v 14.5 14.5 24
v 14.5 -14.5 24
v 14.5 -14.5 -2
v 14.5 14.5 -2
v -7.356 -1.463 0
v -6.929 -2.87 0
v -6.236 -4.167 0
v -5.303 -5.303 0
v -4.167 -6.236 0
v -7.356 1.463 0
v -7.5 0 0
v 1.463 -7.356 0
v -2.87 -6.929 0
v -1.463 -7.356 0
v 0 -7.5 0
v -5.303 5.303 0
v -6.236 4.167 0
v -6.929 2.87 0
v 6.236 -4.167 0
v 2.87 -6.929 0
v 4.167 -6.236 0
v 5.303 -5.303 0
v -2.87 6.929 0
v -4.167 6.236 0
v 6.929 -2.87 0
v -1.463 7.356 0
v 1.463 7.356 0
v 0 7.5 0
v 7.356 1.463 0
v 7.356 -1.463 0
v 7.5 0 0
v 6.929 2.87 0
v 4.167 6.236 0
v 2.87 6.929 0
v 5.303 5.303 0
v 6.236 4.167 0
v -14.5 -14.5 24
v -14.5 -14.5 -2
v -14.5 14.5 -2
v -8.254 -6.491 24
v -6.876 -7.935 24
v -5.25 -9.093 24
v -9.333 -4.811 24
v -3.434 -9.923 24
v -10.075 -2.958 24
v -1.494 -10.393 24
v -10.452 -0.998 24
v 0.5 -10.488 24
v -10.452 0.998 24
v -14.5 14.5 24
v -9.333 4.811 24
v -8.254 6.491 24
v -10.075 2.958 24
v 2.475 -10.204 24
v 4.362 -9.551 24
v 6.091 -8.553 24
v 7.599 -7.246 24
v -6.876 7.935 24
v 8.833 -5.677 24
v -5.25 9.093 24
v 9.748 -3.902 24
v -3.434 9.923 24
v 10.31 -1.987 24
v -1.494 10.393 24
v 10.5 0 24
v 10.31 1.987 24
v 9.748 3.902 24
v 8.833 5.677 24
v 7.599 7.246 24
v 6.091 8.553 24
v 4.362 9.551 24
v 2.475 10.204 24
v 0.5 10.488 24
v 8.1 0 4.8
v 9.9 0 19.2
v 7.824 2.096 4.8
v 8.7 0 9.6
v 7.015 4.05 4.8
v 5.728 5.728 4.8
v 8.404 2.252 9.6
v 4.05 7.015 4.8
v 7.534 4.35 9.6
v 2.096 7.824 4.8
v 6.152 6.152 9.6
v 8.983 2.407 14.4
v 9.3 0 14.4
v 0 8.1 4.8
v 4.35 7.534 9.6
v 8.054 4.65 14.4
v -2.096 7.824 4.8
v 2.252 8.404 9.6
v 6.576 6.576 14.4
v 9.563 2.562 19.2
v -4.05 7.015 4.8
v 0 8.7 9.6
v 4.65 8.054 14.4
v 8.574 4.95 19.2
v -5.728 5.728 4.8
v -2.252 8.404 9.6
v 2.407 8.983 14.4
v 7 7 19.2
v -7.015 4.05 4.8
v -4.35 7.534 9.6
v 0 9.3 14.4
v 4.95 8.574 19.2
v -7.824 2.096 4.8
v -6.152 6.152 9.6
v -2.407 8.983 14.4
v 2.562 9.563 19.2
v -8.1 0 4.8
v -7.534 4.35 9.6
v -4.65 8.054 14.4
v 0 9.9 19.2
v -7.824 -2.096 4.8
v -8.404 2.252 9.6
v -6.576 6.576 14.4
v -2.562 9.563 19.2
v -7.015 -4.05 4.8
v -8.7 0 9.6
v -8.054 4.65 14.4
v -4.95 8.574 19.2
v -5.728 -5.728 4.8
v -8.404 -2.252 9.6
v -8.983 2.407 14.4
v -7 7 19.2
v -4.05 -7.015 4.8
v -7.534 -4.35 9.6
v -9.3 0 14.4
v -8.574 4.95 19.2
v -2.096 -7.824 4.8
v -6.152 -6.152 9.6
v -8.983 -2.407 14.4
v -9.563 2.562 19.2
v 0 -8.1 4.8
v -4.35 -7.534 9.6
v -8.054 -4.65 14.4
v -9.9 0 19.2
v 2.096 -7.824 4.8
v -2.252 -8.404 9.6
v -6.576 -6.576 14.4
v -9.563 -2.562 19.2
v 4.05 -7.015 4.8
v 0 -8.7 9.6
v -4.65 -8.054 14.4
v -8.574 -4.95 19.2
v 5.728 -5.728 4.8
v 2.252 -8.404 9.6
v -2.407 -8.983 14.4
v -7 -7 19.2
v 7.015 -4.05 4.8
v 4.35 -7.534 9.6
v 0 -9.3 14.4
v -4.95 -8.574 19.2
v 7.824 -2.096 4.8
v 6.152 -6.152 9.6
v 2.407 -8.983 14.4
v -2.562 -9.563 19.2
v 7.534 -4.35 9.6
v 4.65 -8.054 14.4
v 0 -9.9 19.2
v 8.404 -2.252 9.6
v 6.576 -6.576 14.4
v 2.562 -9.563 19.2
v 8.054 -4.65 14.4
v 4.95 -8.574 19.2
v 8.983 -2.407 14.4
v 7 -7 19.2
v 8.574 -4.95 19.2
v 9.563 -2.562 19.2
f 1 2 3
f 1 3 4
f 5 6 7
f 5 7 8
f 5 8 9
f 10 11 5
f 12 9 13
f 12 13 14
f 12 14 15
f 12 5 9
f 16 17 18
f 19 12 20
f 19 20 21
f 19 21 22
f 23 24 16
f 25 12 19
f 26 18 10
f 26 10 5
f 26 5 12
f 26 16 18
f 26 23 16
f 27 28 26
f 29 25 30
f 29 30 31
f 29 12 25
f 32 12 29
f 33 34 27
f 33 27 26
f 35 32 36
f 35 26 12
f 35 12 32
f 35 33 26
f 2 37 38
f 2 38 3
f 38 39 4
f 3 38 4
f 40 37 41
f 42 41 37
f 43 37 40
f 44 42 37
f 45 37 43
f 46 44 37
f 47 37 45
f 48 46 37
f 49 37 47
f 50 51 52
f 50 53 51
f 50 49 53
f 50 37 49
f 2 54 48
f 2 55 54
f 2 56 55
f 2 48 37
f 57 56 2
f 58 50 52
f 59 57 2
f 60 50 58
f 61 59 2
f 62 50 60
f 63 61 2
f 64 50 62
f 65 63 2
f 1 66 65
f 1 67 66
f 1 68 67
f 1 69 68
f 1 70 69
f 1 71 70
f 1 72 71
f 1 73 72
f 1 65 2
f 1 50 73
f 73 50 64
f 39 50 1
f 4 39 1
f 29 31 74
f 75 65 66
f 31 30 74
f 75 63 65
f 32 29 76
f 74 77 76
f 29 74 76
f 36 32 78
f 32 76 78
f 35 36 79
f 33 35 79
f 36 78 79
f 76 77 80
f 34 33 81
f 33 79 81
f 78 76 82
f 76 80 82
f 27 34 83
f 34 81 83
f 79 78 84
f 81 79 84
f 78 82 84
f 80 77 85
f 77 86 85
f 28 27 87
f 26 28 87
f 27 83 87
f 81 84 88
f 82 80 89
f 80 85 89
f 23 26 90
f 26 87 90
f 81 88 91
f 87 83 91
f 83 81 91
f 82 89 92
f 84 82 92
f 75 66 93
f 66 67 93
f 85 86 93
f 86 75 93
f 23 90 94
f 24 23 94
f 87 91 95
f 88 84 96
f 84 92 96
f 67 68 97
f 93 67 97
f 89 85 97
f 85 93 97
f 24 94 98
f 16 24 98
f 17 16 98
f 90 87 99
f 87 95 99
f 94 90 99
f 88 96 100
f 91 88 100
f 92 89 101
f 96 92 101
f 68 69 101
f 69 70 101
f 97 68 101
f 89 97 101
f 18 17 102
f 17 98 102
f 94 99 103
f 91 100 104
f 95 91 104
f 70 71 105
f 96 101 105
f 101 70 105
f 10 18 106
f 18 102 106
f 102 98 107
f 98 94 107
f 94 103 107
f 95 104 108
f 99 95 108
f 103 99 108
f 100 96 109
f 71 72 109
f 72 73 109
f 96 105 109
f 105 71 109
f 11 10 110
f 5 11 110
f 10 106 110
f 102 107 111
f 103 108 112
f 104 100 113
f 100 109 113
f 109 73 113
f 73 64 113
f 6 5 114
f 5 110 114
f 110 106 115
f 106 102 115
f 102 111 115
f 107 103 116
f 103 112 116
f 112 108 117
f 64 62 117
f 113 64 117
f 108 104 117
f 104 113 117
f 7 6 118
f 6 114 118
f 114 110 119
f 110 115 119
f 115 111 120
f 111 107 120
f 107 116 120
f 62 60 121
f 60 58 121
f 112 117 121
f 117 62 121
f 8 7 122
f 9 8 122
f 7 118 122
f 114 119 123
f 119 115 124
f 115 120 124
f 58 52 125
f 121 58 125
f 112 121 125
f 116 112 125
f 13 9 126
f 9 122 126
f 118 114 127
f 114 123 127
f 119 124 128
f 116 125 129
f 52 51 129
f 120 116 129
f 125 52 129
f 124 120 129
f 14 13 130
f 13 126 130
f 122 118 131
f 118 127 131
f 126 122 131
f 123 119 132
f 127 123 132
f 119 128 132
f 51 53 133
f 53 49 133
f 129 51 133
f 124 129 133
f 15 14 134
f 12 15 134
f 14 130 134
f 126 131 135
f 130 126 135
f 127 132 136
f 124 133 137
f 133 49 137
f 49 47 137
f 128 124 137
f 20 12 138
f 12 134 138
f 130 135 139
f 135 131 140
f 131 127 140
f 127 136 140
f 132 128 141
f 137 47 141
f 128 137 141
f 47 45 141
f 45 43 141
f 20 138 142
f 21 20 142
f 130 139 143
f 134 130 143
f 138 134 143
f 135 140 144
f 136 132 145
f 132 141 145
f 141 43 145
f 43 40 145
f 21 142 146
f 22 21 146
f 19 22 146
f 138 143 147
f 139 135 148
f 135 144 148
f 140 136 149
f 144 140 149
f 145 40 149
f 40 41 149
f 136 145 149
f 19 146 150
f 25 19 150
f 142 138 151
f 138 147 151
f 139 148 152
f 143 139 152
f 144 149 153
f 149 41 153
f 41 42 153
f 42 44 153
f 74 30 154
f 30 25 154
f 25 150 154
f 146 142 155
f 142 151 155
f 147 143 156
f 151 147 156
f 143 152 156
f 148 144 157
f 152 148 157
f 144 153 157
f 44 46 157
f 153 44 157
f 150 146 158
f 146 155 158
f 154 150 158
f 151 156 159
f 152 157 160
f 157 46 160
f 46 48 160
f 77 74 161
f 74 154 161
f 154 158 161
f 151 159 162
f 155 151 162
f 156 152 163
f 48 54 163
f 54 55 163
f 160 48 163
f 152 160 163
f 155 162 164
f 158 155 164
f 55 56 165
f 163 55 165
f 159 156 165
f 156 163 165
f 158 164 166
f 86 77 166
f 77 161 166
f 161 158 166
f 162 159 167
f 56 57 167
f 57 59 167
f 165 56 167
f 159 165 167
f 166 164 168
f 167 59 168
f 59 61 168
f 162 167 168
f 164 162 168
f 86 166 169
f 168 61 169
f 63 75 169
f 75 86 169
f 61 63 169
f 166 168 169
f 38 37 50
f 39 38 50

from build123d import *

# Parameters (mm, degrees)
F0_W     = 29
F0_H     = 29
F0_R     = 10.5
F0_R_2   = 7.5
F3_DEPTH = 24
F2_R     = 10.5
F5_DEPTH = 1
F6_DEPTH = 2


with BuildPart() as f3:
    # F0 (on Top) → F3 (new body, through all)
    with BuildSketch(Plane.XY):
        Rectangle(F0_W, F0_H)
        Circle(F0_R, mode=Mode.SUBTRACT)
        Circle(F0_R)
        Circle(F0_R_2, mode=Mode.SUBTRACT)
    extrude(amount=F3_DEPTH)

    # F0 (on Top) → F4 section 0
    with BuildSketch(Plane.XY):
        Circle(F0_R_2)
    # F2 (on offset) → F4 section 1
    with BuildSketch(Plane.XY.offset(24)):
        Circle(F2_R)
    loft(mode=Mode.SUBTRACT)

    # F0 (on Top) → F5 (join)
    with BuildSketch(Plane.XY):
        Rectangle(F0_W, F0_H)
        Circle(F0_R, mode=Mode.SUBTRACT)
        Circle(F0_R)
        Circle(F0_R_2, mode=Mode.SUBTRACT)
    extrude(amount=-F5_DEPTH)

    # F0 (on Top) → F6 (join)
    with BuildSketch(Plane.XY):
        Rectangle(F0_W, F0_H)
        Circle(F0_R, mode=Mode.SUBTRACT)
        Circle(F0_R)
        Circle(F0_R_2, mode=Mode.SUBTRACT)
        Circle(F0_R_2)
    extrude(amount=-F6_DEPTH)


solid = f3.part
